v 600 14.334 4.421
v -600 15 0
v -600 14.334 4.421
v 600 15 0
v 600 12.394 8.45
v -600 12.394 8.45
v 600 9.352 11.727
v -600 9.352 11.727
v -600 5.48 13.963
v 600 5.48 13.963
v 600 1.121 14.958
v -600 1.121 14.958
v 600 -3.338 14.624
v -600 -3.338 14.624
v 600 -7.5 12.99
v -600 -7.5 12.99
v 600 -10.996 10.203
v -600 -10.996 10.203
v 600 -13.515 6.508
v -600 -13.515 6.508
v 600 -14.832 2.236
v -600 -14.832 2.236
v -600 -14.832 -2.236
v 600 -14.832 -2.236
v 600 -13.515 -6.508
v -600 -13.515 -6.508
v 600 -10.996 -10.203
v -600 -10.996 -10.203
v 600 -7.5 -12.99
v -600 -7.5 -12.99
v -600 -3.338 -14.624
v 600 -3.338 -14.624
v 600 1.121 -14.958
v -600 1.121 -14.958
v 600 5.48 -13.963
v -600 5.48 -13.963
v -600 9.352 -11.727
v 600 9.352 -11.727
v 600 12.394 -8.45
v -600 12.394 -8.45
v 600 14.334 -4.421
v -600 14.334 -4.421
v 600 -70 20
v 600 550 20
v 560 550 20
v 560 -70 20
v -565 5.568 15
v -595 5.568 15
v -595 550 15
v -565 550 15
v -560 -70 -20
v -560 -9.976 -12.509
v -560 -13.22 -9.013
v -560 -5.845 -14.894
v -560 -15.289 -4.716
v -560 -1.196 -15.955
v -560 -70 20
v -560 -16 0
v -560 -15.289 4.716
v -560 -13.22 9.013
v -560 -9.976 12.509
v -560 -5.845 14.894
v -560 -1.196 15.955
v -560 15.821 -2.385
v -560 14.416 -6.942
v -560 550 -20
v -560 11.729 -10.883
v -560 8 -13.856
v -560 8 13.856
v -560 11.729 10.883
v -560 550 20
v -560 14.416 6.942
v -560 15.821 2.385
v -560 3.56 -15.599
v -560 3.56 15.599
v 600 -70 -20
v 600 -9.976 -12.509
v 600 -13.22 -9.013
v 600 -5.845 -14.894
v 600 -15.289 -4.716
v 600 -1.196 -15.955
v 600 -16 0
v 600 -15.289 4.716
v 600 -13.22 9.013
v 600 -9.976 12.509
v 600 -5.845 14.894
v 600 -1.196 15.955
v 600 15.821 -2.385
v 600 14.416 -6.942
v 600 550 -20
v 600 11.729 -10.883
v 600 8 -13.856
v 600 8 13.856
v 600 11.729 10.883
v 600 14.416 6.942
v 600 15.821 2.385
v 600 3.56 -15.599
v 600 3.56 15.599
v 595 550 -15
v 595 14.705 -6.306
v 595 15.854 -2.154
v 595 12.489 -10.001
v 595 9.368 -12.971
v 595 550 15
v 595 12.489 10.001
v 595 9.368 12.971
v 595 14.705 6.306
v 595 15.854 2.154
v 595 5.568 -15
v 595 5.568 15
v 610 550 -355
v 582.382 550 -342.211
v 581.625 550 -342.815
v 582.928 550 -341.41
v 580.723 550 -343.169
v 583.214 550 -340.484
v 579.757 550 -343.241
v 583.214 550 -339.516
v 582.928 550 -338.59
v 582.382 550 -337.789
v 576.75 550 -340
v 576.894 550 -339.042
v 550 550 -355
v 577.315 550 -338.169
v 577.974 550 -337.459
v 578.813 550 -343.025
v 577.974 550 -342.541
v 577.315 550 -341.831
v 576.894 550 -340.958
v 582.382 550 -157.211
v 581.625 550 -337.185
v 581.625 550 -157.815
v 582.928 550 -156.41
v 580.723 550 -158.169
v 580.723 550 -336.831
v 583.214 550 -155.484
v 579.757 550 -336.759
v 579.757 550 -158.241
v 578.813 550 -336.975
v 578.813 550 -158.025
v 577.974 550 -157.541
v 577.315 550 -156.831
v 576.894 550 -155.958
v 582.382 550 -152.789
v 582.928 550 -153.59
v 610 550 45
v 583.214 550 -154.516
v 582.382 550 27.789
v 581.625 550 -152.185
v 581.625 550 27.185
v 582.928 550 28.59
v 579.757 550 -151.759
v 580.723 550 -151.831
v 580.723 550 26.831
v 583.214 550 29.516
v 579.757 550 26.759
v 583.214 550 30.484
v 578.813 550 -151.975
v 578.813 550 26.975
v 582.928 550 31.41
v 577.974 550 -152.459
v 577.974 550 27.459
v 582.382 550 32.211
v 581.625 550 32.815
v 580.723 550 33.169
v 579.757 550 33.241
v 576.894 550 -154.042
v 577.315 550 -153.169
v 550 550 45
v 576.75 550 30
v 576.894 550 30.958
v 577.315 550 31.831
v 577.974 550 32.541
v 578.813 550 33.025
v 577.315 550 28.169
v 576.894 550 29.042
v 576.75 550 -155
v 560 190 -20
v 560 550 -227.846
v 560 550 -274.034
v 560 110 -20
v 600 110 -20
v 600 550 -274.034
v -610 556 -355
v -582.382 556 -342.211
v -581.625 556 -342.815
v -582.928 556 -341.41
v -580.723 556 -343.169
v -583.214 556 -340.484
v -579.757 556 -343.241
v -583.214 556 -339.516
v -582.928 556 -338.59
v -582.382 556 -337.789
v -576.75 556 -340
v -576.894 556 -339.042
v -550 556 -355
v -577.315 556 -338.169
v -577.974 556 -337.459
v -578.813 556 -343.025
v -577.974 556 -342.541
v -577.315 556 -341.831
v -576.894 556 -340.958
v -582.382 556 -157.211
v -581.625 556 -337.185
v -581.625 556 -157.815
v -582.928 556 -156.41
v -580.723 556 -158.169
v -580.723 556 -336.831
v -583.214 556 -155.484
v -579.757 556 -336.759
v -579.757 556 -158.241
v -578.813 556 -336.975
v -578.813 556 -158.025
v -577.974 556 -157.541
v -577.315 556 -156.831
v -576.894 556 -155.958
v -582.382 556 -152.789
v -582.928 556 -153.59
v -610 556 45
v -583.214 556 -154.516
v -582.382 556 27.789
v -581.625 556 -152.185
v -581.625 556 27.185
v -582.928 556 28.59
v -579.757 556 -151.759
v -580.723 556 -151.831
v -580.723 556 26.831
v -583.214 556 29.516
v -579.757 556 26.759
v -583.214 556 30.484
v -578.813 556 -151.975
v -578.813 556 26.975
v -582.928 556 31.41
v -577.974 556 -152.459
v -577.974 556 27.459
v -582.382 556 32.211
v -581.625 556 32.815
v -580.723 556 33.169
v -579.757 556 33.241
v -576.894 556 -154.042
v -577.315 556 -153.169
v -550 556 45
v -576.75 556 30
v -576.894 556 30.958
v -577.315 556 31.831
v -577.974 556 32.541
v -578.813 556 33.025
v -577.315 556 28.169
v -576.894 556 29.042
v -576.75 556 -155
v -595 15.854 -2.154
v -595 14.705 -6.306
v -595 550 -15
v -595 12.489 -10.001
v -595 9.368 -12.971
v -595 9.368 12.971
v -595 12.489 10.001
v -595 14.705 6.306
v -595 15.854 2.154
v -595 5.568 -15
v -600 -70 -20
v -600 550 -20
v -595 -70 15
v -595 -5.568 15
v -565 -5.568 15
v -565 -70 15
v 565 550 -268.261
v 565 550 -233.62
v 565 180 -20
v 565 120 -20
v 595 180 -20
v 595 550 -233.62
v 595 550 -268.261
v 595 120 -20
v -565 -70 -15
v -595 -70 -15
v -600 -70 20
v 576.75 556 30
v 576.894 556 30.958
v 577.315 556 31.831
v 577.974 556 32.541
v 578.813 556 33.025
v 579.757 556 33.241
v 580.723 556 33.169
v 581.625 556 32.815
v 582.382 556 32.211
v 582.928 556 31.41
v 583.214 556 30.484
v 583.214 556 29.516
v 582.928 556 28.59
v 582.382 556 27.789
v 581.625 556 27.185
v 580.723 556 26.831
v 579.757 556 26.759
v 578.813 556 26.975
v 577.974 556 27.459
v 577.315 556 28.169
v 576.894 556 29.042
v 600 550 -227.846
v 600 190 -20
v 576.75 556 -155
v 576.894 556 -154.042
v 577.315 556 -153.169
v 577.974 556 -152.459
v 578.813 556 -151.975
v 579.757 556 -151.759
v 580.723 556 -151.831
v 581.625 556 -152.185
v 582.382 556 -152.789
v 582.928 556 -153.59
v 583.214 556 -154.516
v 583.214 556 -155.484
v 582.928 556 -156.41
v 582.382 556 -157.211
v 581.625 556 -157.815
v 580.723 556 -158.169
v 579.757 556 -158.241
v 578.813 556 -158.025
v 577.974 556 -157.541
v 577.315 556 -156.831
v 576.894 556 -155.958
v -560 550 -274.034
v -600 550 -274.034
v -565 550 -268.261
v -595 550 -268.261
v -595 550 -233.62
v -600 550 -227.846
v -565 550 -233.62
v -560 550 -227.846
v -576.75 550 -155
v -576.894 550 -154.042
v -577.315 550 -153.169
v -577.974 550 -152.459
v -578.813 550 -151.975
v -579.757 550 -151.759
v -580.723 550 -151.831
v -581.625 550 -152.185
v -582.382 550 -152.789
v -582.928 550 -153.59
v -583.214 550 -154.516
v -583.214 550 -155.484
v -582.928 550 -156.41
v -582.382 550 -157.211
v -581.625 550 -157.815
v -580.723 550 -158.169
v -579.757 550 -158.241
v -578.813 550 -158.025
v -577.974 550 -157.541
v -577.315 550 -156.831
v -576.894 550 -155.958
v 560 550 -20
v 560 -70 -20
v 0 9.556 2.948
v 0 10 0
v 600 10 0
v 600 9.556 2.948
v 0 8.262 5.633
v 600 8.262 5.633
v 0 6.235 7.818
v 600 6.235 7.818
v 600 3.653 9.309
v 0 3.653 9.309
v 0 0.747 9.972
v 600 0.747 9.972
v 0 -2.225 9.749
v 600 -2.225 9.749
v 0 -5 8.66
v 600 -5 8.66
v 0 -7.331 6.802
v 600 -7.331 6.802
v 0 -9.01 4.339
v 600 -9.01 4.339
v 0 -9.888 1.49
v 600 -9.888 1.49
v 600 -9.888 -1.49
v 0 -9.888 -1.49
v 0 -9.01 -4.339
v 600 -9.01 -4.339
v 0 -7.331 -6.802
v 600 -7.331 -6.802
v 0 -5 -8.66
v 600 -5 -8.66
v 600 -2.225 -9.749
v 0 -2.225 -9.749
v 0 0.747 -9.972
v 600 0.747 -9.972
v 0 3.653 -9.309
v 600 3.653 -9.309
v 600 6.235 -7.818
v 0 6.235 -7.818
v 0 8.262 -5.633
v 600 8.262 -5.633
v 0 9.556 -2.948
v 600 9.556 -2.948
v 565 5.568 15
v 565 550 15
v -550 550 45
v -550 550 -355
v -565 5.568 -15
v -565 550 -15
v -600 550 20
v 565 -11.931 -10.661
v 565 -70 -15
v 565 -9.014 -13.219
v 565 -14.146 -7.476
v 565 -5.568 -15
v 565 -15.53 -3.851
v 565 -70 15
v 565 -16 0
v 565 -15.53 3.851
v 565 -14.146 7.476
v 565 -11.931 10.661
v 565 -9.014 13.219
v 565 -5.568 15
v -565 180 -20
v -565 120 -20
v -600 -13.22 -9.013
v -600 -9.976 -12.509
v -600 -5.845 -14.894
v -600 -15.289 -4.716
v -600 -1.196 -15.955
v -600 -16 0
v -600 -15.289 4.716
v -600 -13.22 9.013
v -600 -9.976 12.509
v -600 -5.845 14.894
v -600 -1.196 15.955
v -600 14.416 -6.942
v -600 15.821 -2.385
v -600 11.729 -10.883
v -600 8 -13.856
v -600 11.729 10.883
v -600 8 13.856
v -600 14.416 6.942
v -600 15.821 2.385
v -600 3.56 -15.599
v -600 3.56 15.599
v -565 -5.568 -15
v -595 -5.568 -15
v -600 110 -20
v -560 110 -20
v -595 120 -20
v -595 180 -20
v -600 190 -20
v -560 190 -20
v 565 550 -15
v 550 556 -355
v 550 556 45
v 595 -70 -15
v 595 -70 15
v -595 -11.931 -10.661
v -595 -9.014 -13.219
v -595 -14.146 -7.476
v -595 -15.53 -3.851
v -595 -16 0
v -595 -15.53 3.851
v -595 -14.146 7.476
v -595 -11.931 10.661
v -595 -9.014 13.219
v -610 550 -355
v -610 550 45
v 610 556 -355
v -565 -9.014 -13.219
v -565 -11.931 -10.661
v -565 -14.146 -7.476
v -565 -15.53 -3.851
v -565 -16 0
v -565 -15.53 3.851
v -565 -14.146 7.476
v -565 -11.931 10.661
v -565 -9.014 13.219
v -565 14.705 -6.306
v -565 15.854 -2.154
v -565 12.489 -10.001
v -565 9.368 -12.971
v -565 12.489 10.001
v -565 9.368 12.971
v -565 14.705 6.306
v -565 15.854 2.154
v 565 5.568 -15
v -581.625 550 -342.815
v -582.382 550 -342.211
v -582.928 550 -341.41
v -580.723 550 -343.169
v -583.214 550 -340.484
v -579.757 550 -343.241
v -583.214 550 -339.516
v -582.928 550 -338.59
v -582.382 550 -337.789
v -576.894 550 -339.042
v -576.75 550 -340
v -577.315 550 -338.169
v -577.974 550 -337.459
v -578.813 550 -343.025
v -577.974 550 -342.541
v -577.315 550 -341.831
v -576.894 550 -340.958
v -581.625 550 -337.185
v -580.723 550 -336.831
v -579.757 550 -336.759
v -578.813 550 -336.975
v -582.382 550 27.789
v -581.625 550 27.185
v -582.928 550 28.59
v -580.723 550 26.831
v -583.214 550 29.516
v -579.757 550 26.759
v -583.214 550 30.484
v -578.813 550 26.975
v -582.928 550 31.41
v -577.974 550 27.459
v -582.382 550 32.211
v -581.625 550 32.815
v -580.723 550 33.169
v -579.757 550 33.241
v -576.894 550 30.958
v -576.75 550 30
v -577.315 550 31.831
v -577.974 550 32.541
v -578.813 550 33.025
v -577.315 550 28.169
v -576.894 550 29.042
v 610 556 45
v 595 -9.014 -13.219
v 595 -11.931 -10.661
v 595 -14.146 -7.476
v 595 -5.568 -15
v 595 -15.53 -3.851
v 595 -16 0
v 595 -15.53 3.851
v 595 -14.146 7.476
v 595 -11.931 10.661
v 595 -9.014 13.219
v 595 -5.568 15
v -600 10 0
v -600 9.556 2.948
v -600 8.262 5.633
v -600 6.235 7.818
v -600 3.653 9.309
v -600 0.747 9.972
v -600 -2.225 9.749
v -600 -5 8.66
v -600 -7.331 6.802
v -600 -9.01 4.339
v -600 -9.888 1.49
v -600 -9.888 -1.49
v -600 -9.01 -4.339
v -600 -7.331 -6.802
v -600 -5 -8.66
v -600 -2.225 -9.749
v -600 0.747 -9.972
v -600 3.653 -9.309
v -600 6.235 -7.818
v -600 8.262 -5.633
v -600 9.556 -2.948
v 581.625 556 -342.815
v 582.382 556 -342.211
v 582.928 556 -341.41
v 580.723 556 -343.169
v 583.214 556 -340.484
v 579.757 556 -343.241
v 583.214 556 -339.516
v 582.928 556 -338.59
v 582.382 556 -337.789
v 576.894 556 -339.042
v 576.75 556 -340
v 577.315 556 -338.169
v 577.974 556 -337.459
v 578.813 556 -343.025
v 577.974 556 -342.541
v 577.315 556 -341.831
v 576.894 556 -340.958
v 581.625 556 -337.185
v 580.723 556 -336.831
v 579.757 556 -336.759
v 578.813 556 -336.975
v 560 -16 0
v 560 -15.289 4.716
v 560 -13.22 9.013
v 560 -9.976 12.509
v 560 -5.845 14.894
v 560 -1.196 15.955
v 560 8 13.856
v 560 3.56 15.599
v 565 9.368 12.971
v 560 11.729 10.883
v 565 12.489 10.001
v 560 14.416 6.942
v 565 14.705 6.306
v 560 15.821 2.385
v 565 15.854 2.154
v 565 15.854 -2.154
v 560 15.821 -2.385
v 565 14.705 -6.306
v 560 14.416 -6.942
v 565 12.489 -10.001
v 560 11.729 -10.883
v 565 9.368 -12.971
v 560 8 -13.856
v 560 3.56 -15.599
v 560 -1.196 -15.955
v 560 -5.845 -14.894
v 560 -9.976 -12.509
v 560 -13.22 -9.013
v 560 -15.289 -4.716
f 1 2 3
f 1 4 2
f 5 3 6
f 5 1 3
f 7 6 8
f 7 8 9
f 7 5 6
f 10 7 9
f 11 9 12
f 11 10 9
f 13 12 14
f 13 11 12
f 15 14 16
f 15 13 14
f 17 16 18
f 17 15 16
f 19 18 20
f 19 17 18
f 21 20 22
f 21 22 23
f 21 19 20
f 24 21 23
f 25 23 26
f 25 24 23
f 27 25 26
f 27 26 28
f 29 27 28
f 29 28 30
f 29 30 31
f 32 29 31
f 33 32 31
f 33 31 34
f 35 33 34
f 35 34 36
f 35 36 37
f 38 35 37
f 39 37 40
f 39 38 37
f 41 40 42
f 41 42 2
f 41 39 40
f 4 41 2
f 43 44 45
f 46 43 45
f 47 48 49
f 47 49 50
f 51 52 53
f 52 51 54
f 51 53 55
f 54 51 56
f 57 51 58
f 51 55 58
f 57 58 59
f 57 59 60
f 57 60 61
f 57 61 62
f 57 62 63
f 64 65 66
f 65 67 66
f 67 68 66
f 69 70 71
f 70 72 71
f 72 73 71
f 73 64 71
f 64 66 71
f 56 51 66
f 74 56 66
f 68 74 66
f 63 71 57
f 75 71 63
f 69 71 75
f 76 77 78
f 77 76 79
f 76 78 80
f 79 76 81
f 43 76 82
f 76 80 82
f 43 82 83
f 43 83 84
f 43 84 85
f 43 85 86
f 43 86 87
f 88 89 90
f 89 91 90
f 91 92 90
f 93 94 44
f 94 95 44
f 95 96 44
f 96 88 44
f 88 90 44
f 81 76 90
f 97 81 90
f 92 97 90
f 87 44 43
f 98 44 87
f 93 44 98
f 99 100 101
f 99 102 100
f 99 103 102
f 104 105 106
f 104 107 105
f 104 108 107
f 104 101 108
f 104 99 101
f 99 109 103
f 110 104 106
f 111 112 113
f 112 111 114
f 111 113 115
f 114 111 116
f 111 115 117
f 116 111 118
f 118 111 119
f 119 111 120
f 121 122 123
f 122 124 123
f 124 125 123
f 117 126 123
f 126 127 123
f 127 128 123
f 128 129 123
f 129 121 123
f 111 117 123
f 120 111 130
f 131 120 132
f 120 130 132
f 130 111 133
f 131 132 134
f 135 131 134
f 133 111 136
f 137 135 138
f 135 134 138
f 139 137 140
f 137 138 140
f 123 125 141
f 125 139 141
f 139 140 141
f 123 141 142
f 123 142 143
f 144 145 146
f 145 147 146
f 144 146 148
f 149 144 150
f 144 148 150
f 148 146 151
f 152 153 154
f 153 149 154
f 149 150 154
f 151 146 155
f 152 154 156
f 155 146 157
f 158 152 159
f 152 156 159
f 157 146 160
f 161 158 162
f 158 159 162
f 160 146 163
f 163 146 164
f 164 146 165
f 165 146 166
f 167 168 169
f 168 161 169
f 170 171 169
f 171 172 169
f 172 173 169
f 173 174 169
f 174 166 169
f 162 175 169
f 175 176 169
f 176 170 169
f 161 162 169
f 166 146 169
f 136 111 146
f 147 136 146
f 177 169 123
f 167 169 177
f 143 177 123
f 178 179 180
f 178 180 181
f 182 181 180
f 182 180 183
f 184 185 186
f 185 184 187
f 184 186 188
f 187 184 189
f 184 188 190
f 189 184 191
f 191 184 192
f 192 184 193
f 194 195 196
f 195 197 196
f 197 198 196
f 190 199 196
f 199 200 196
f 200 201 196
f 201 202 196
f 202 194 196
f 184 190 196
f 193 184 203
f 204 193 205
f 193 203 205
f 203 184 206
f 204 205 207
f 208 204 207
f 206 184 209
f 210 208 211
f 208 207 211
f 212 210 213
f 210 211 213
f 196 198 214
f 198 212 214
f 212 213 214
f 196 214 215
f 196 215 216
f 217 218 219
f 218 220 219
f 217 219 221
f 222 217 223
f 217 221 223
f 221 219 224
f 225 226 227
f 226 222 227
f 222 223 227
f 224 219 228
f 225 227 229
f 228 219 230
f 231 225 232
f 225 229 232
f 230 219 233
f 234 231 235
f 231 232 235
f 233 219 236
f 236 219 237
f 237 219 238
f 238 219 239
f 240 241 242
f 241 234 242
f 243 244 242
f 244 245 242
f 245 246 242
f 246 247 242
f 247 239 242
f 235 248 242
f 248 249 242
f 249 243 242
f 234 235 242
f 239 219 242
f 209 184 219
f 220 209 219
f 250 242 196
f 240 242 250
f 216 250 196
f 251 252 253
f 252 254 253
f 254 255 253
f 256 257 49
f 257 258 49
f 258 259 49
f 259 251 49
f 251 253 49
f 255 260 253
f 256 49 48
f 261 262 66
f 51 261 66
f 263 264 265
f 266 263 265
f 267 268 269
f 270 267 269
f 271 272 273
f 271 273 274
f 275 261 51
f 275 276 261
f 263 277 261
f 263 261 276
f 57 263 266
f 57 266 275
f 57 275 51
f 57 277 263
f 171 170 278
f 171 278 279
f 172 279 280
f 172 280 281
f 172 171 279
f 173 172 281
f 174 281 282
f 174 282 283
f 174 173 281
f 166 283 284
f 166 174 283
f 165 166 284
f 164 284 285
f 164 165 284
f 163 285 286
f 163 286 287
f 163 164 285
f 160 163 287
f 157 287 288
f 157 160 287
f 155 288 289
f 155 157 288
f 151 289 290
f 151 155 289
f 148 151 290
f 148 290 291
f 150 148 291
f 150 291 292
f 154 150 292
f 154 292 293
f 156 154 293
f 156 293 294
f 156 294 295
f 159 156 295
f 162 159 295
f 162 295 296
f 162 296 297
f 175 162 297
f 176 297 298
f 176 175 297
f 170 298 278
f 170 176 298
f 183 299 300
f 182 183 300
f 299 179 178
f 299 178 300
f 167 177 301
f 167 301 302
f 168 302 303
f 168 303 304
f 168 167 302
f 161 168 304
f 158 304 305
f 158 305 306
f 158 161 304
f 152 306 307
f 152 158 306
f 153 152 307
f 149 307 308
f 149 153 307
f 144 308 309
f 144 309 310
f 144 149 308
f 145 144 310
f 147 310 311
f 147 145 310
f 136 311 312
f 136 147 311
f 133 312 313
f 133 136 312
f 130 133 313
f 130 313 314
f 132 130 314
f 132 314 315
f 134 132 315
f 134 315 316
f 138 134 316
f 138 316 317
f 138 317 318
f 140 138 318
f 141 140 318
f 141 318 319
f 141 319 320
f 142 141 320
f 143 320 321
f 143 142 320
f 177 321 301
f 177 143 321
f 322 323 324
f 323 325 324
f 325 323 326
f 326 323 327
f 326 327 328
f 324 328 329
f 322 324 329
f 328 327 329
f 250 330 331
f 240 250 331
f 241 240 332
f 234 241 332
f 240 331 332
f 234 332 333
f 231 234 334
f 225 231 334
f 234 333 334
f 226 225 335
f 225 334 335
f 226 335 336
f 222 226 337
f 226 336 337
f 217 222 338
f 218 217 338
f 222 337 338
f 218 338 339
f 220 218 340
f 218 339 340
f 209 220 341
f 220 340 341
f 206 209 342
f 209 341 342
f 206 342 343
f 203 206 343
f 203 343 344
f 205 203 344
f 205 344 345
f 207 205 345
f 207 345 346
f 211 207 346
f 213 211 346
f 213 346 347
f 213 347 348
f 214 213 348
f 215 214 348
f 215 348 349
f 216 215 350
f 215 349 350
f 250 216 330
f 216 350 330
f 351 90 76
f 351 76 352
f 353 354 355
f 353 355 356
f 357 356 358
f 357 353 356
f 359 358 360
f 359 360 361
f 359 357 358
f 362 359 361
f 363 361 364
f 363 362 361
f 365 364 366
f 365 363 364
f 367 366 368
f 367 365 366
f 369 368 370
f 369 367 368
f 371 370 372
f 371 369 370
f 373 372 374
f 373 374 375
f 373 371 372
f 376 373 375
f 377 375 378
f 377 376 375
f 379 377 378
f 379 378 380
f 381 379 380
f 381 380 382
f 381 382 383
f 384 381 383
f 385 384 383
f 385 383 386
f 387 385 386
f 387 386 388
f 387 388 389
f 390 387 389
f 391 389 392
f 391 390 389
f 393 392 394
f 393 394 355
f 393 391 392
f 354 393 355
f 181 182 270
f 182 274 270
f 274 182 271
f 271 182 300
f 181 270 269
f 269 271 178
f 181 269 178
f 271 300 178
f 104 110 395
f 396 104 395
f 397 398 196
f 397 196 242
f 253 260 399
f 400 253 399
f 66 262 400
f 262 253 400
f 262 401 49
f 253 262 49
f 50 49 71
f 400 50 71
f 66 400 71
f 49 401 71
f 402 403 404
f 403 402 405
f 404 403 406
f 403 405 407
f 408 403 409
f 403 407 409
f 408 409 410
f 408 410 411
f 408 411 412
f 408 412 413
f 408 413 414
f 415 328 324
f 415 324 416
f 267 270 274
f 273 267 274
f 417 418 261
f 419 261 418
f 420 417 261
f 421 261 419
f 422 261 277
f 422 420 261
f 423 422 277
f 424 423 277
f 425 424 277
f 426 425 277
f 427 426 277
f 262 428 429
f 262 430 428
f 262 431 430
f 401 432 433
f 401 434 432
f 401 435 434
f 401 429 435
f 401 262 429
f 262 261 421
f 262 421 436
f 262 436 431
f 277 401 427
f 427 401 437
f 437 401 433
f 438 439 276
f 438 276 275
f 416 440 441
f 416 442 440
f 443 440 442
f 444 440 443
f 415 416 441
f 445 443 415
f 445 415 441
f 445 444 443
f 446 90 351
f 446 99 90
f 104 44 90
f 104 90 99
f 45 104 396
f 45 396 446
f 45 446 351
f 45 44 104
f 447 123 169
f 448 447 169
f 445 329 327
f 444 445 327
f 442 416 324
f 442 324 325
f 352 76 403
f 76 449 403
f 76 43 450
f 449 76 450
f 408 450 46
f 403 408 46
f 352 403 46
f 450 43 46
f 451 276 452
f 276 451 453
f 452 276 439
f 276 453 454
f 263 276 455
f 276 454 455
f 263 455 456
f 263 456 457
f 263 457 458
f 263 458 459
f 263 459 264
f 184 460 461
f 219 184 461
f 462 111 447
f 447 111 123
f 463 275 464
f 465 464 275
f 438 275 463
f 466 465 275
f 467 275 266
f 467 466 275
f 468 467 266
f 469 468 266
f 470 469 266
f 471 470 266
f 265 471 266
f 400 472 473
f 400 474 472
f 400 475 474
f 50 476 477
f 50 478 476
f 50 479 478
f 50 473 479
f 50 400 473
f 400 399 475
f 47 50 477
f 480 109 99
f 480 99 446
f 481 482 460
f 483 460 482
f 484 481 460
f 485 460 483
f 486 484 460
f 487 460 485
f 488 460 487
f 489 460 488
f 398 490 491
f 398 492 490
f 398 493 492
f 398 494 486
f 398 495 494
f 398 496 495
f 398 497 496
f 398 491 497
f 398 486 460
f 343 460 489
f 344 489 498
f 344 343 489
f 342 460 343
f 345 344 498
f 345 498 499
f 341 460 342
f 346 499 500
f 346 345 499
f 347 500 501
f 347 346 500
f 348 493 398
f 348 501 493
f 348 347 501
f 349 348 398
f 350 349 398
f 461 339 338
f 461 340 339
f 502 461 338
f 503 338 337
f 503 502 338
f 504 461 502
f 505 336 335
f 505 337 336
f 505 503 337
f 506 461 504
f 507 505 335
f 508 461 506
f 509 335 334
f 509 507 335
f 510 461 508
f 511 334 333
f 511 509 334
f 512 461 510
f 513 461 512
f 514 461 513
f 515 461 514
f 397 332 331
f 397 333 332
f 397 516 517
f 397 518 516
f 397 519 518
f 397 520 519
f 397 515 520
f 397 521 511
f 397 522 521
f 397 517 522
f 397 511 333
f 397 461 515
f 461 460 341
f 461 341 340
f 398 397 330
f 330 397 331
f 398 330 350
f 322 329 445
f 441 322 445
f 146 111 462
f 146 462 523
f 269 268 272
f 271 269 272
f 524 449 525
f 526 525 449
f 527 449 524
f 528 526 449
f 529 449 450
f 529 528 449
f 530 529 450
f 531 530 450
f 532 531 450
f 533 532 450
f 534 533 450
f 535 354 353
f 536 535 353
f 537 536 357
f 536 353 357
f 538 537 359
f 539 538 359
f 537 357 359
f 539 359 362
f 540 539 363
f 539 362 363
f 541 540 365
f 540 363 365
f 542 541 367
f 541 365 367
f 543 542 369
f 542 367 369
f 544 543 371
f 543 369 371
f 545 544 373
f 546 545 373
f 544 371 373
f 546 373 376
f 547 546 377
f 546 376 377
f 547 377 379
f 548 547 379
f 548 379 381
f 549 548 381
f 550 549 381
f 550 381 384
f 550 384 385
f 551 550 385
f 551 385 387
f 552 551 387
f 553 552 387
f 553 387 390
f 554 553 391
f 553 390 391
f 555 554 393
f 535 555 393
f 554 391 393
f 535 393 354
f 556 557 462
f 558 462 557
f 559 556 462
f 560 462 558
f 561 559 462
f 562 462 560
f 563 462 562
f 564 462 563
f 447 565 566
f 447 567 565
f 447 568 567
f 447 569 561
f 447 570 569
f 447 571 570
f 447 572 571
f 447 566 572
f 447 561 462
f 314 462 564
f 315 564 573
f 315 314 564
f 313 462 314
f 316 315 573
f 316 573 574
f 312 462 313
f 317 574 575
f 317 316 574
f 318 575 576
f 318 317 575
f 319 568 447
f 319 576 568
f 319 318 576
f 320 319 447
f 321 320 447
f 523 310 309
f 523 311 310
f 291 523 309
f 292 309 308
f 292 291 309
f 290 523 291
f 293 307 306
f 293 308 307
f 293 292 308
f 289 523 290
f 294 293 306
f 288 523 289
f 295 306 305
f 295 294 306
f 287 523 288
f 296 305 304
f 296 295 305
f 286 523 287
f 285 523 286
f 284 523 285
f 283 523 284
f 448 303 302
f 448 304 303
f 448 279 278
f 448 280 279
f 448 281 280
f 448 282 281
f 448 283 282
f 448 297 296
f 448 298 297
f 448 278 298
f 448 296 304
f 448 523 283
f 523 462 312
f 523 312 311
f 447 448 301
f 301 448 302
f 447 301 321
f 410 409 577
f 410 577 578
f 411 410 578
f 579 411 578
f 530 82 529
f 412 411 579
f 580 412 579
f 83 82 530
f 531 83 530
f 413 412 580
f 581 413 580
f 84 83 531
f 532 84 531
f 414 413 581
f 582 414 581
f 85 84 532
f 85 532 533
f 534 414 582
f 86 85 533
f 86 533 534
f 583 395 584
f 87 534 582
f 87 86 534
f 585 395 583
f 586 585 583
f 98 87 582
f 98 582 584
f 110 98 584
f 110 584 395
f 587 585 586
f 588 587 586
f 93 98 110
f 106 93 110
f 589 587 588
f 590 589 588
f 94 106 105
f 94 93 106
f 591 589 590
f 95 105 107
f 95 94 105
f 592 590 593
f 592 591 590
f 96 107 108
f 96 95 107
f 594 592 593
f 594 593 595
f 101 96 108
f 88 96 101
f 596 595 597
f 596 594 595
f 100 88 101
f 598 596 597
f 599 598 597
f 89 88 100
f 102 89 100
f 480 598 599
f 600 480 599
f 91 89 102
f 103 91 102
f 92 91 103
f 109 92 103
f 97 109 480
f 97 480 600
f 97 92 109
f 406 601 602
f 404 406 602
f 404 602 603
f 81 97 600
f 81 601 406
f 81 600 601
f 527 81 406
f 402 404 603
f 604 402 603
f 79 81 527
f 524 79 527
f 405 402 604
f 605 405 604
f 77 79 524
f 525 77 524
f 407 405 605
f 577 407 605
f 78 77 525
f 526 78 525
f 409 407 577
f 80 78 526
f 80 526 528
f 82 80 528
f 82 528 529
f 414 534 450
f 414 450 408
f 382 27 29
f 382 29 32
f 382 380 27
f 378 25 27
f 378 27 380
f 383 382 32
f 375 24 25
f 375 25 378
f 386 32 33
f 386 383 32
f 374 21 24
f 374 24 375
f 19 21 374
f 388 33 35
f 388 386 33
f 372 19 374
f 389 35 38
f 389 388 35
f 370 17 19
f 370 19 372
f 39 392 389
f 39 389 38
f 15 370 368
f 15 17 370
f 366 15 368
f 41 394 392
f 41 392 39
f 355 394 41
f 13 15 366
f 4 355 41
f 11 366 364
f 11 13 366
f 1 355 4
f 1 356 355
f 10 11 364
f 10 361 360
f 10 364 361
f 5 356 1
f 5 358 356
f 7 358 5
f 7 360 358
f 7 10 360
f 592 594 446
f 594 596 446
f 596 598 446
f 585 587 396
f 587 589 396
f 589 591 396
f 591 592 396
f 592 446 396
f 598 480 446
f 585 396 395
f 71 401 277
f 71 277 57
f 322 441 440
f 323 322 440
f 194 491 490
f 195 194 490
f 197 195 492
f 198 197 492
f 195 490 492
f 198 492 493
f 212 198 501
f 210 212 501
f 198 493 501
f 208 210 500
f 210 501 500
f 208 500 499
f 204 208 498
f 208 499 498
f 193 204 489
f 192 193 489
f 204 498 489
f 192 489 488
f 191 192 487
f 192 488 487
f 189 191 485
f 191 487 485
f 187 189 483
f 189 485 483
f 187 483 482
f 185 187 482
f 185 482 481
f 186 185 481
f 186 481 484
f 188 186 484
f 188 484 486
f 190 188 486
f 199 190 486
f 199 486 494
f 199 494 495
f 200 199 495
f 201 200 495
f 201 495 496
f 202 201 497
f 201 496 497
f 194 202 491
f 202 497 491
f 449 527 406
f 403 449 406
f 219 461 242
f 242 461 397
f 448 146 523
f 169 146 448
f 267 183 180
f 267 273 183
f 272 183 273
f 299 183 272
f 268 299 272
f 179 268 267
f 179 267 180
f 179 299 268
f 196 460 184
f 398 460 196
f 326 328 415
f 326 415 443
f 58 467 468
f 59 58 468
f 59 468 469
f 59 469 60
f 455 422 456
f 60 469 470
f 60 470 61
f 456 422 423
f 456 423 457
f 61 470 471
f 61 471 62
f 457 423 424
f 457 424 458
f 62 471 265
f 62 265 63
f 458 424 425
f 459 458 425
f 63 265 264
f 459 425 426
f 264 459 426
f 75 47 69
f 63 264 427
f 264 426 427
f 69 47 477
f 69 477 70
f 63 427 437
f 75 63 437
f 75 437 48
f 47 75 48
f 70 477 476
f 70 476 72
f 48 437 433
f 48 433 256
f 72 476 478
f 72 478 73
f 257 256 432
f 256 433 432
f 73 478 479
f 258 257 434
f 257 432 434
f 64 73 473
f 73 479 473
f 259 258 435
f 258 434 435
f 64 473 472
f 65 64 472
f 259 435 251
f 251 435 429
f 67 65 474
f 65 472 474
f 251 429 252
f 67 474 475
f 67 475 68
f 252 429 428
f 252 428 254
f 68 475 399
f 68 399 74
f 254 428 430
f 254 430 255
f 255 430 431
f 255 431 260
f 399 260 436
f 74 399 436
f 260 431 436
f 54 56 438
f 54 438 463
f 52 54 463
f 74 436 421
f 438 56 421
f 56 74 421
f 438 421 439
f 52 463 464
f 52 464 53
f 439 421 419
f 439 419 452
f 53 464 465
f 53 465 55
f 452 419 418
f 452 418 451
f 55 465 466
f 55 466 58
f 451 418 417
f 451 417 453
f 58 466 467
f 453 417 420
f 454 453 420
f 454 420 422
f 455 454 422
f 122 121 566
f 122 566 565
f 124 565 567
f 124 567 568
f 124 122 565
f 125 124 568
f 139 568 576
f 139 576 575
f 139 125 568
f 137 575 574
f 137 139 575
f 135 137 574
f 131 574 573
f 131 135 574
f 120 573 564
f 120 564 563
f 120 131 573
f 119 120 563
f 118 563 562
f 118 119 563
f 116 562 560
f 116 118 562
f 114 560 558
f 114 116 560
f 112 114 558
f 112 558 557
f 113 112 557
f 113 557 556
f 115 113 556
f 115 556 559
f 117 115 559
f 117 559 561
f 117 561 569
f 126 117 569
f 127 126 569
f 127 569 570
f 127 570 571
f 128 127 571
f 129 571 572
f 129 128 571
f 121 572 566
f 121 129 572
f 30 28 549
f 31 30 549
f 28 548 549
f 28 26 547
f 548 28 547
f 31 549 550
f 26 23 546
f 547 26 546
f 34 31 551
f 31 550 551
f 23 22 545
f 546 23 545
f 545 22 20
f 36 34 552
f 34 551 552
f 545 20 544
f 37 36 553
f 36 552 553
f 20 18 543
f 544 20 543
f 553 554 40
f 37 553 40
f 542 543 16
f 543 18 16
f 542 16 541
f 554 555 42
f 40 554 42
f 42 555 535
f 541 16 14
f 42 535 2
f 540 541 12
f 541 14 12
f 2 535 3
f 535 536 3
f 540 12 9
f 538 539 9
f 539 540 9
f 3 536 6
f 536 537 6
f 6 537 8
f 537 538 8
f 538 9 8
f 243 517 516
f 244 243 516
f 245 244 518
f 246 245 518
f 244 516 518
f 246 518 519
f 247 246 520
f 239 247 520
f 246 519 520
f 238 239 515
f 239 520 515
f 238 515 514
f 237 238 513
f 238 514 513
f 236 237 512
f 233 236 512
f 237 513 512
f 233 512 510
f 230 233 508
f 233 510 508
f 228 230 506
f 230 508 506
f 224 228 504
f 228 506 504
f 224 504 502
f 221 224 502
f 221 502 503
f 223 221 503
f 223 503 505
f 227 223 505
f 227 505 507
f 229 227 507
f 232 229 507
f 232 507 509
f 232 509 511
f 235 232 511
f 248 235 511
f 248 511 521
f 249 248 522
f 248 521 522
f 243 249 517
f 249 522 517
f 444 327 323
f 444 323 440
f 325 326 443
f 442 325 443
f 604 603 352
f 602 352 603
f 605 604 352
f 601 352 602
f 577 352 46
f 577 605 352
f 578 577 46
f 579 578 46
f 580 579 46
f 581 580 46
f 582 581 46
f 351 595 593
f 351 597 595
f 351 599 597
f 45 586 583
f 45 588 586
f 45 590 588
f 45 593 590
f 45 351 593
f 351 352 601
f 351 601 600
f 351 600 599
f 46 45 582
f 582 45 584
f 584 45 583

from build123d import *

# Parameters (mm, degrees)
F0_R          = 15
F0_R_2        = 10
F1_DEPTH      = 600
F1_DEPTH_BACK = 600
F3_W          = 40
F3_H          = 40
F3_W_2        = 30
F3_H_2        = 30
F4_DEPTH      = 620
F5_R          = 16
F6_DEPTH      = 53.9
F7_W          = 60
F7_H          = 400
F7_R          = 3.25
F8_DEPTH      = 6
F10_W         = 40
F10_H         = 40
F10_W_2       = 30
F10_H_2       = 30
F11_FACE_W    = 40
F11_FACE_H    = 40
F11_FACE_W_2  = 30
F11_FACE_H_2  = 30
F12_REACH     = 626.0052928413


with BuildPart() as f1:
    # F0 (on Right) → F1 (new body, two sides)
    with BuildSketch(Plane.YZ) as f1_sk:
        Circle(F0_R)
        Circle(F0_R_2, mode=Mode.SUBTRACT)
    extrude(amount=F1_DEPTH)
    extrude(f1_sk.sketch, amount=-F1_DEPTH_BACK)


with BuildPart() as f4:
    # F3 (on offset) → F4 (new body)
    with BuildSketch(Plane.XZ.offset(-550)):
        with Locations((-580, 0)):
            Rectangle(F3_W, F3_H)
        with Locations((-580, 0)):
            Rectangle(F3_W_2, F3_H_2, mode=Mode.SUBTRACT)
    extrude(amount=F4_DEPTH)

    # F5 (on face) → F6 (cut)
    with BuildSketch(Plane(origin=(-600, 0, 0), x_dir=(0, -1, 0), z_dir=(-1, 0, 0))):
        Circle(F5_R)
    extrude(amount=-F6_DEPTH, mode=Mode.SUBTRACT)


with BuildPart() as f8:
    # F7 (on offset) → F8 (new body)
    with BuildSketch(Plane.XZ.offset(-550)):
        with Locations((-580, -155)):
            Rectangle(F7_W, F7_H)
        with Locations((-580, -340)):
            Circle(F7_R, mode=Mode.SUBTRACT)
        with Locations((-580, -155)):
            Circle(F7_R, mode=Mode.SUBTRACT)
        with Locations((-580, 30)):
            Circle(F7_R, mode=Mode.SUBTRACT)
    extrude(amount=-F8_DEPTH)


with BuildPart() as f11:
    # F10 (on face) → F11 (new body, up to the next surface of F8)
    with BuildSketch(Plane(origin=(0, 421.1602540378, -243.1569860407), x_dir=(-1, 0, 0), z_dir=(0, 0.8660254038, -0.5))):
        with Locations((580, 57.6794919243)):
            Rectangle(F10_W, F10_H)
        with Locations((580, 57.6794919243)):
            Rectangle(F10_W_2, F10_H_2, mode=Mode.SUBTRACT)
    extrude(until=Until.NEXT, target=f8.part)

    f12_end = f4.part.faces().sort_by_distance((-580, 240, -20))[0]
    # F11_face (on face) → F12 (join, up to a face of F4 that its end follows)
    with BuildSketch(Plane(origin=(-580, 450, -193.2050807569), x_dir=(-1, 0, 0), z_dir=(0, -0.8660254038, 0.5))):
        Rectangle(F11_FACE_W, F11_FACE_H)
        Rectangle(F11_FACE_W_2, F11_FACE_H_2, mode=Mode.SUBTRACT)
    f12_long = extrude(amount=F12_REACH, mode=Mode.PRIVATE)
    add(split(f12_long, bisect_by=f12_end, keep=Keep.TOP, mode=Mode.PRIVATE))


with BuildPart() as f13_1:
    # F13: instance of F4
    add(f4.part.mirror(Plane.YZ))


with BuildPart() as f13_2:
    # F13: instance of F8
    add(f8.part.mirror(Plane.YZ))


with BuildPart() as f13_3:
    # F13: instance of F11
    add(f11.part.mirror(Plane.YZ))


solid = Compound([f1.part, f4.part, f8.part, f11.part, f13_1.part, f13_2.part, f13_3.part])
